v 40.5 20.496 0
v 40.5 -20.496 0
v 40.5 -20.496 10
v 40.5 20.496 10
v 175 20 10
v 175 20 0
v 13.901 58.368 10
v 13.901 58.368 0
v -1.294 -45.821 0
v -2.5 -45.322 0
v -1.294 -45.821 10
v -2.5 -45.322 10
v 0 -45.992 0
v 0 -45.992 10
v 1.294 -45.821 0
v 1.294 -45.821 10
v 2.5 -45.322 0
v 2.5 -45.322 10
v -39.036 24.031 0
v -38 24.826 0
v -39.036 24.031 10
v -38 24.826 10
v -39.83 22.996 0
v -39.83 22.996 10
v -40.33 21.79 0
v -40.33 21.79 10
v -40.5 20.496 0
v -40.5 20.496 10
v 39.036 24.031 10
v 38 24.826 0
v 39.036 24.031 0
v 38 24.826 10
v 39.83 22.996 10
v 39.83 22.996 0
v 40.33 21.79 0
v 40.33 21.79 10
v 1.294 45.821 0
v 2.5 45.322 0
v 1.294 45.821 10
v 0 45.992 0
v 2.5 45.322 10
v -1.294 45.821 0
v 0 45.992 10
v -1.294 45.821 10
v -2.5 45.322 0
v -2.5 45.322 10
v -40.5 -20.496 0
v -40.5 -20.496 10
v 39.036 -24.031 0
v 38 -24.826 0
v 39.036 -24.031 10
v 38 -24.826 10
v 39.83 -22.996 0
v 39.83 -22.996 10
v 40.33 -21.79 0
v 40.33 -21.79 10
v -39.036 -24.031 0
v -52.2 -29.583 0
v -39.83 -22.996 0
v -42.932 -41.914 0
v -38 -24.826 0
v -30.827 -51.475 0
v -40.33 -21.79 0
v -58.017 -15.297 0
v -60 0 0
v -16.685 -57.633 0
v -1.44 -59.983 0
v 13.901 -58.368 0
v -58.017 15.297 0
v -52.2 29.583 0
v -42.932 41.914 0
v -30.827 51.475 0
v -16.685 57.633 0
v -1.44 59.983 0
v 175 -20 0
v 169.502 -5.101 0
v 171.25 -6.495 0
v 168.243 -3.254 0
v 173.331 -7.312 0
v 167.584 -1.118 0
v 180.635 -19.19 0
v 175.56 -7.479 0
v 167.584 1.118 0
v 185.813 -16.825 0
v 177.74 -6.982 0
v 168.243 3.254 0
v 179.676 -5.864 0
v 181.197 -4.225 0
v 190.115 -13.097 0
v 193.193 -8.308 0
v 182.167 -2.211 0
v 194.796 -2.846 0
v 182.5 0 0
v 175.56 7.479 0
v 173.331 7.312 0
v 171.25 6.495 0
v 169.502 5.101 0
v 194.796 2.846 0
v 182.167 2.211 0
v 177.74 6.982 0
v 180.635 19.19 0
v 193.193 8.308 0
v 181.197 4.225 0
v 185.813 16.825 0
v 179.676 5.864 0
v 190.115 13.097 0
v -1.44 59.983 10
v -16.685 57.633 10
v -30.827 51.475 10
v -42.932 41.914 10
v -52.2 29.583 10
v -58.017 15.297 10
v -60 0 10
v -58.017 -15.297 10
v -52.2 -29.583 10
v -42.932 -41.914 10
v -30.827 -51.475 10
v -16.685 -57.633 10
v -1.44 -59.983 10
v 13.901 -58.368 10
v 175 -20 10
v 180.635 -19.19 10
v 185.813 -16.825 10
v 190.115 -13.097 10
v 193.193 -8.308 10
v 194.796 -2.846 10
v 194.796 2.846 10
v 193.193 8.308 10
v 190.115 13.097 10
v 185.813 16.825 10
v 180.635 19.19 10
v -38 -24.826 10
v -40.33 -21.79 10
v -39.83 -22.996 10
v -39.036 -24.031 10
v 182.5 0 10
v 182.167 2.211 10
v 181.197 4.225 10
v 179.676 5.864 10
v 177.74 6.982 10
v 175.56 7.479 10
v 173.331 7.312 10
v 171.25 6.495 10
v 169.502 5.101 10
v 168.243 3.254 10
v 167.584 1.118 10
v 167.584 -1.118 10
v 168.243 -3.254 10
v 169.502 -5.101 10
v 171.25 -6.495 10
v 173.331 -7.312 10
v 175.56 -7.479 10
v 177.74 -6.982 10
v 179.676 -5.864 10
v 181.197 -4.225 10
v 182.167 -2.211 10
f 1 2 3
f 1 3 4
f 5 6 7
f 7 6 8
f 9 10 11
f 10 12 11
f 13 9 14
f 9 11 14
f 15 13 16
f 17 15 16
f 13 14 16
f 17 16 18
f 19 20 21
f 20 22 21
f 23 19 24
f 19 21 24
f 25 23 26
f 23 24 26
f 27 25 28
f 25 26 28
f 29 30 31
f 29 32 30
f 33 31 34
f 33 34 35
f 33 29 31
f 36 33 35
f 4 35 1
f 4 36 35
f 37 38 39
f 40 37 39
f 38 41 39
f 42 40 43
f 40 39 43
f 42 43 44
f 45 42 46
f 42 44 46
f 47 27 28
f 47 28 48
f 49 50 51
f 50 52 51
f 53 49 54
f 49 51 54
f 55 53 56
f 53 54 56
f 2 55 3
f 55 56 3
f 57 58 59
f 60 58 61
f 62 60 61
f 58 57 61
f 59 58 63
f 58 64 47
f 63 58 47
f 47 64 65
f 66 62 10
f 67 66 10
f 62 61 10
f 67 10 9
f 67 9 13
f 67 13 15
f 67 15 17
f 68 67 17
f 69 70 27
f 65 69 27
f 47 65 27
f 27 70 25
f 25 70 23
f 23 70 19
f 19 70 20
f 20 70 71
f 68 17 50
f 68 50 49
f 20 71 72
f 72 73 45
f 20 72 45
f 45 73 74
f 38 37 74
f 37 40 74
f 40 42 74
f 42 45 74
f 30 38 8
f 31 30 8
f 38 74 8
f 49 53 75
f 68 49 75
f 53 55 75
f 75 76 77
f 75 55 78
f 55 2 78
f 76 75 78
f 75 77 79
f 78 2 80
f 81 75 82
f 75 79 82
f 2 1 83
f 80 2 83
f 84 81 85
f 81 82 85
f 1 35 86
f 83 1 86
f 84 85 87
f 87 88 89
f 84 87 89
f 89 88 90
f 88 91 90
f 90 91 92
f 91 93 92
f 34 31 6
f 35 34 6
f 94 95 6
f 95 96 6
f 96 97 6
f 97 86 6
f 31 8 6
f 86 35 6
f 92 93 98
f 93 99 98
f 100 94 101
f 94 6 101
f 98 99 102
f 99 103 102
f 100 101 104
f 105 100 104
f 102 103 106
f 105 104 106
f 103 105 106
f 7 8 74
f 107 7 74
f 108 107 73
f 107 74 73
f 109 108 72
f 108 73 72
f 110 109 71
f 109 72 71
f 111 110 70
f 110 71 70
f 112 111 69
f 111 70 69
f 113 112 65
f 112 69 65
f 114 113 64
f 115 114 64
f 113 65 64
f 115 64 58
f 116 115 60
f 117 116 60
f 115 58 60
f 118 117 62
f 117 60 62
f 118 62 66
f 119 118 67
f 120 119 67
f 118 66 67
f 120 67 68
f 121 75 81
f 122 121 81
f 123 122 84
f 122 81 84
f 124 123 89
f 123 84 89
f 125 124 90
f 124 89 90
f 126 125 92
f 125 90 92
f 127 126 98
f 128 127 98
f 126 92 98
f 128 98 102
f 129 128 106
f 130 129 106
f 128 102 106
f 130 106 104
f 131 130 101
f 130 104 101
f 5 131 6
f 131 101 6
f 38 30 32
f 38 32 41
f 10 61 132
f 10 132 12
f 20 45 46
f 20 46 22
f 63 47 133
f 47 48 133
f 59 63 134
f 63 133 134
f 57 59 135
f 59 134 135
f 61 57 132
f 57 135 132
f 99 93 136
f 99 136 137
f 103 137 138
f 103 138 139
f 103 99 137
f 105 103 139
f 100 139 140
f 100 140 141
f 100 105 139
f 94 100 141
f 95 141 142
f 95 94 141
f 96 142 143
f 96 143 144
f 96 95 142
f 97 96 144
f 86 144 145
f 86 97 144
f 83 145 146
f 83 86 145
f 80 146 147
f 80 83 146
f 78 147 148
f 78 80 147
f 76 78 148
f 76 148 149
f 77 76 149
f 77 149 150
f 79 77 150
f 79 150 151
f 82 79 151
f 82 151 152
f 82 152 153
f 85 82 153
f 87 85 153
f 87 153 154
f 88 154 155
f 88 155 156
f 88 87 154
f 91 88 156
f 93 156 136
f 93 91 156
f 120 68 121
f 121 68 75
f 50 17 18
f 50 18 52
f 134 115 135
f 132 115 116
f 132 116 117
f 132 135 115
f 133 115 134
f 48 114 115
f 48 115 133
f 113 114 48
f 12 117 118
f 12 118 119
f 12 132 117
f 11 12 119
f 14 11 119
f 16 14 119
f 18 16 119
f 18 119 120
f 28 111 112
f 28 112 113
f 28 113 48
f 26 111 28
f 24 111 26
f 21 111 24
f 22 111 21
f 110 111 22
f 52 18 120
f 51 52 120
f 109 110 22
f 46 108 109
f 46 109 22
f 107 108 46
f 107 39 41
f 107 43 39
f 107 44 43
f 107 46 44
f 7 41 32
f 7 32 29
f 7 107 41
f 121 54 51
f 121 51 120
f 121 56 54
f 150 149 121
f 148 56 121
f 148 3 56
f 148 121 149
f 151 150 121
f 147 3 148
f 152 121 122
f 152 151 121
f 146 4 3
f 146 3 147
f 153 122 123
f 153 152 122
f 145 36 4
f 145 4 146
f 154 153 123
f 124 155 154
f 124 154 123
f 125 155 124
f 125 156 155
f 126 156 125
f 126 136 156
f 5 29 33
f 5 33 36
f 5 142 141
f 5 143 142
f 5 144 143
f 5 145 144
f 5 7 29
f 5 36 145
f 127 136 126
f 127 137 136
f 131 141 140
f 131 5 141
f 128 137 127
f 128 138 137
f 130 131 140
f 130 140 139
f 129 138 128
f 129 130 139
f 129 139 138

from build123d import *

# Parameters (mm, degrees)
SKETCH1_R           = 7.5
BOSS_EXTRUDE1_DEPTH = 10
FILLET1_R           = 5


with BuildPart() as part:
    # Sketch1 → Boss-Extrude1 (new body)
    with BuildSketch(Plane.XY):
        with BuildLine():
            Line((175, 20), (13.900856021, 58.367509814))
            ThreePointArc((13.900856021, 58.367509814), (-60, 0), (13.900856021, -58.367509814))
            Line((13.900856021, -58.367509814), (175, -20))
            ThreePointArc((175, -20), (195, 0), (175, 20))
        make_face()
        with Locations((175, 0)):
            Circle(SKETCH1_R, mode=Mode.SUBTRACT)
        Polygon((40.5, 23.382685902), (0, 46.765371804), (-40.5, 23.382685902), (-40.5, -23.382685902), (0, -46.765371804), (40.5, -23.382685902), align=None, mode=Mode.SUBTRACT)
    extrude(amount=BOSS_EXTRUDE1_DEPTH)

    # Fillet1
    fillet1_edges = [part.edges().sort_by_distance(p)[0] for p in [
        (0, -46.765371804, 5),
        (40.5, -23.382685902, 5),
        (40.5, 23.382685902, 5),
        (0, 46.765371804, 5),
        (-40.5, 23.382685902, 5),
        (-40.5, -23.382685902, 5),
    ]]
    fillet(fillet1_edges, radius=FILLET1_R)


solid = part.part
